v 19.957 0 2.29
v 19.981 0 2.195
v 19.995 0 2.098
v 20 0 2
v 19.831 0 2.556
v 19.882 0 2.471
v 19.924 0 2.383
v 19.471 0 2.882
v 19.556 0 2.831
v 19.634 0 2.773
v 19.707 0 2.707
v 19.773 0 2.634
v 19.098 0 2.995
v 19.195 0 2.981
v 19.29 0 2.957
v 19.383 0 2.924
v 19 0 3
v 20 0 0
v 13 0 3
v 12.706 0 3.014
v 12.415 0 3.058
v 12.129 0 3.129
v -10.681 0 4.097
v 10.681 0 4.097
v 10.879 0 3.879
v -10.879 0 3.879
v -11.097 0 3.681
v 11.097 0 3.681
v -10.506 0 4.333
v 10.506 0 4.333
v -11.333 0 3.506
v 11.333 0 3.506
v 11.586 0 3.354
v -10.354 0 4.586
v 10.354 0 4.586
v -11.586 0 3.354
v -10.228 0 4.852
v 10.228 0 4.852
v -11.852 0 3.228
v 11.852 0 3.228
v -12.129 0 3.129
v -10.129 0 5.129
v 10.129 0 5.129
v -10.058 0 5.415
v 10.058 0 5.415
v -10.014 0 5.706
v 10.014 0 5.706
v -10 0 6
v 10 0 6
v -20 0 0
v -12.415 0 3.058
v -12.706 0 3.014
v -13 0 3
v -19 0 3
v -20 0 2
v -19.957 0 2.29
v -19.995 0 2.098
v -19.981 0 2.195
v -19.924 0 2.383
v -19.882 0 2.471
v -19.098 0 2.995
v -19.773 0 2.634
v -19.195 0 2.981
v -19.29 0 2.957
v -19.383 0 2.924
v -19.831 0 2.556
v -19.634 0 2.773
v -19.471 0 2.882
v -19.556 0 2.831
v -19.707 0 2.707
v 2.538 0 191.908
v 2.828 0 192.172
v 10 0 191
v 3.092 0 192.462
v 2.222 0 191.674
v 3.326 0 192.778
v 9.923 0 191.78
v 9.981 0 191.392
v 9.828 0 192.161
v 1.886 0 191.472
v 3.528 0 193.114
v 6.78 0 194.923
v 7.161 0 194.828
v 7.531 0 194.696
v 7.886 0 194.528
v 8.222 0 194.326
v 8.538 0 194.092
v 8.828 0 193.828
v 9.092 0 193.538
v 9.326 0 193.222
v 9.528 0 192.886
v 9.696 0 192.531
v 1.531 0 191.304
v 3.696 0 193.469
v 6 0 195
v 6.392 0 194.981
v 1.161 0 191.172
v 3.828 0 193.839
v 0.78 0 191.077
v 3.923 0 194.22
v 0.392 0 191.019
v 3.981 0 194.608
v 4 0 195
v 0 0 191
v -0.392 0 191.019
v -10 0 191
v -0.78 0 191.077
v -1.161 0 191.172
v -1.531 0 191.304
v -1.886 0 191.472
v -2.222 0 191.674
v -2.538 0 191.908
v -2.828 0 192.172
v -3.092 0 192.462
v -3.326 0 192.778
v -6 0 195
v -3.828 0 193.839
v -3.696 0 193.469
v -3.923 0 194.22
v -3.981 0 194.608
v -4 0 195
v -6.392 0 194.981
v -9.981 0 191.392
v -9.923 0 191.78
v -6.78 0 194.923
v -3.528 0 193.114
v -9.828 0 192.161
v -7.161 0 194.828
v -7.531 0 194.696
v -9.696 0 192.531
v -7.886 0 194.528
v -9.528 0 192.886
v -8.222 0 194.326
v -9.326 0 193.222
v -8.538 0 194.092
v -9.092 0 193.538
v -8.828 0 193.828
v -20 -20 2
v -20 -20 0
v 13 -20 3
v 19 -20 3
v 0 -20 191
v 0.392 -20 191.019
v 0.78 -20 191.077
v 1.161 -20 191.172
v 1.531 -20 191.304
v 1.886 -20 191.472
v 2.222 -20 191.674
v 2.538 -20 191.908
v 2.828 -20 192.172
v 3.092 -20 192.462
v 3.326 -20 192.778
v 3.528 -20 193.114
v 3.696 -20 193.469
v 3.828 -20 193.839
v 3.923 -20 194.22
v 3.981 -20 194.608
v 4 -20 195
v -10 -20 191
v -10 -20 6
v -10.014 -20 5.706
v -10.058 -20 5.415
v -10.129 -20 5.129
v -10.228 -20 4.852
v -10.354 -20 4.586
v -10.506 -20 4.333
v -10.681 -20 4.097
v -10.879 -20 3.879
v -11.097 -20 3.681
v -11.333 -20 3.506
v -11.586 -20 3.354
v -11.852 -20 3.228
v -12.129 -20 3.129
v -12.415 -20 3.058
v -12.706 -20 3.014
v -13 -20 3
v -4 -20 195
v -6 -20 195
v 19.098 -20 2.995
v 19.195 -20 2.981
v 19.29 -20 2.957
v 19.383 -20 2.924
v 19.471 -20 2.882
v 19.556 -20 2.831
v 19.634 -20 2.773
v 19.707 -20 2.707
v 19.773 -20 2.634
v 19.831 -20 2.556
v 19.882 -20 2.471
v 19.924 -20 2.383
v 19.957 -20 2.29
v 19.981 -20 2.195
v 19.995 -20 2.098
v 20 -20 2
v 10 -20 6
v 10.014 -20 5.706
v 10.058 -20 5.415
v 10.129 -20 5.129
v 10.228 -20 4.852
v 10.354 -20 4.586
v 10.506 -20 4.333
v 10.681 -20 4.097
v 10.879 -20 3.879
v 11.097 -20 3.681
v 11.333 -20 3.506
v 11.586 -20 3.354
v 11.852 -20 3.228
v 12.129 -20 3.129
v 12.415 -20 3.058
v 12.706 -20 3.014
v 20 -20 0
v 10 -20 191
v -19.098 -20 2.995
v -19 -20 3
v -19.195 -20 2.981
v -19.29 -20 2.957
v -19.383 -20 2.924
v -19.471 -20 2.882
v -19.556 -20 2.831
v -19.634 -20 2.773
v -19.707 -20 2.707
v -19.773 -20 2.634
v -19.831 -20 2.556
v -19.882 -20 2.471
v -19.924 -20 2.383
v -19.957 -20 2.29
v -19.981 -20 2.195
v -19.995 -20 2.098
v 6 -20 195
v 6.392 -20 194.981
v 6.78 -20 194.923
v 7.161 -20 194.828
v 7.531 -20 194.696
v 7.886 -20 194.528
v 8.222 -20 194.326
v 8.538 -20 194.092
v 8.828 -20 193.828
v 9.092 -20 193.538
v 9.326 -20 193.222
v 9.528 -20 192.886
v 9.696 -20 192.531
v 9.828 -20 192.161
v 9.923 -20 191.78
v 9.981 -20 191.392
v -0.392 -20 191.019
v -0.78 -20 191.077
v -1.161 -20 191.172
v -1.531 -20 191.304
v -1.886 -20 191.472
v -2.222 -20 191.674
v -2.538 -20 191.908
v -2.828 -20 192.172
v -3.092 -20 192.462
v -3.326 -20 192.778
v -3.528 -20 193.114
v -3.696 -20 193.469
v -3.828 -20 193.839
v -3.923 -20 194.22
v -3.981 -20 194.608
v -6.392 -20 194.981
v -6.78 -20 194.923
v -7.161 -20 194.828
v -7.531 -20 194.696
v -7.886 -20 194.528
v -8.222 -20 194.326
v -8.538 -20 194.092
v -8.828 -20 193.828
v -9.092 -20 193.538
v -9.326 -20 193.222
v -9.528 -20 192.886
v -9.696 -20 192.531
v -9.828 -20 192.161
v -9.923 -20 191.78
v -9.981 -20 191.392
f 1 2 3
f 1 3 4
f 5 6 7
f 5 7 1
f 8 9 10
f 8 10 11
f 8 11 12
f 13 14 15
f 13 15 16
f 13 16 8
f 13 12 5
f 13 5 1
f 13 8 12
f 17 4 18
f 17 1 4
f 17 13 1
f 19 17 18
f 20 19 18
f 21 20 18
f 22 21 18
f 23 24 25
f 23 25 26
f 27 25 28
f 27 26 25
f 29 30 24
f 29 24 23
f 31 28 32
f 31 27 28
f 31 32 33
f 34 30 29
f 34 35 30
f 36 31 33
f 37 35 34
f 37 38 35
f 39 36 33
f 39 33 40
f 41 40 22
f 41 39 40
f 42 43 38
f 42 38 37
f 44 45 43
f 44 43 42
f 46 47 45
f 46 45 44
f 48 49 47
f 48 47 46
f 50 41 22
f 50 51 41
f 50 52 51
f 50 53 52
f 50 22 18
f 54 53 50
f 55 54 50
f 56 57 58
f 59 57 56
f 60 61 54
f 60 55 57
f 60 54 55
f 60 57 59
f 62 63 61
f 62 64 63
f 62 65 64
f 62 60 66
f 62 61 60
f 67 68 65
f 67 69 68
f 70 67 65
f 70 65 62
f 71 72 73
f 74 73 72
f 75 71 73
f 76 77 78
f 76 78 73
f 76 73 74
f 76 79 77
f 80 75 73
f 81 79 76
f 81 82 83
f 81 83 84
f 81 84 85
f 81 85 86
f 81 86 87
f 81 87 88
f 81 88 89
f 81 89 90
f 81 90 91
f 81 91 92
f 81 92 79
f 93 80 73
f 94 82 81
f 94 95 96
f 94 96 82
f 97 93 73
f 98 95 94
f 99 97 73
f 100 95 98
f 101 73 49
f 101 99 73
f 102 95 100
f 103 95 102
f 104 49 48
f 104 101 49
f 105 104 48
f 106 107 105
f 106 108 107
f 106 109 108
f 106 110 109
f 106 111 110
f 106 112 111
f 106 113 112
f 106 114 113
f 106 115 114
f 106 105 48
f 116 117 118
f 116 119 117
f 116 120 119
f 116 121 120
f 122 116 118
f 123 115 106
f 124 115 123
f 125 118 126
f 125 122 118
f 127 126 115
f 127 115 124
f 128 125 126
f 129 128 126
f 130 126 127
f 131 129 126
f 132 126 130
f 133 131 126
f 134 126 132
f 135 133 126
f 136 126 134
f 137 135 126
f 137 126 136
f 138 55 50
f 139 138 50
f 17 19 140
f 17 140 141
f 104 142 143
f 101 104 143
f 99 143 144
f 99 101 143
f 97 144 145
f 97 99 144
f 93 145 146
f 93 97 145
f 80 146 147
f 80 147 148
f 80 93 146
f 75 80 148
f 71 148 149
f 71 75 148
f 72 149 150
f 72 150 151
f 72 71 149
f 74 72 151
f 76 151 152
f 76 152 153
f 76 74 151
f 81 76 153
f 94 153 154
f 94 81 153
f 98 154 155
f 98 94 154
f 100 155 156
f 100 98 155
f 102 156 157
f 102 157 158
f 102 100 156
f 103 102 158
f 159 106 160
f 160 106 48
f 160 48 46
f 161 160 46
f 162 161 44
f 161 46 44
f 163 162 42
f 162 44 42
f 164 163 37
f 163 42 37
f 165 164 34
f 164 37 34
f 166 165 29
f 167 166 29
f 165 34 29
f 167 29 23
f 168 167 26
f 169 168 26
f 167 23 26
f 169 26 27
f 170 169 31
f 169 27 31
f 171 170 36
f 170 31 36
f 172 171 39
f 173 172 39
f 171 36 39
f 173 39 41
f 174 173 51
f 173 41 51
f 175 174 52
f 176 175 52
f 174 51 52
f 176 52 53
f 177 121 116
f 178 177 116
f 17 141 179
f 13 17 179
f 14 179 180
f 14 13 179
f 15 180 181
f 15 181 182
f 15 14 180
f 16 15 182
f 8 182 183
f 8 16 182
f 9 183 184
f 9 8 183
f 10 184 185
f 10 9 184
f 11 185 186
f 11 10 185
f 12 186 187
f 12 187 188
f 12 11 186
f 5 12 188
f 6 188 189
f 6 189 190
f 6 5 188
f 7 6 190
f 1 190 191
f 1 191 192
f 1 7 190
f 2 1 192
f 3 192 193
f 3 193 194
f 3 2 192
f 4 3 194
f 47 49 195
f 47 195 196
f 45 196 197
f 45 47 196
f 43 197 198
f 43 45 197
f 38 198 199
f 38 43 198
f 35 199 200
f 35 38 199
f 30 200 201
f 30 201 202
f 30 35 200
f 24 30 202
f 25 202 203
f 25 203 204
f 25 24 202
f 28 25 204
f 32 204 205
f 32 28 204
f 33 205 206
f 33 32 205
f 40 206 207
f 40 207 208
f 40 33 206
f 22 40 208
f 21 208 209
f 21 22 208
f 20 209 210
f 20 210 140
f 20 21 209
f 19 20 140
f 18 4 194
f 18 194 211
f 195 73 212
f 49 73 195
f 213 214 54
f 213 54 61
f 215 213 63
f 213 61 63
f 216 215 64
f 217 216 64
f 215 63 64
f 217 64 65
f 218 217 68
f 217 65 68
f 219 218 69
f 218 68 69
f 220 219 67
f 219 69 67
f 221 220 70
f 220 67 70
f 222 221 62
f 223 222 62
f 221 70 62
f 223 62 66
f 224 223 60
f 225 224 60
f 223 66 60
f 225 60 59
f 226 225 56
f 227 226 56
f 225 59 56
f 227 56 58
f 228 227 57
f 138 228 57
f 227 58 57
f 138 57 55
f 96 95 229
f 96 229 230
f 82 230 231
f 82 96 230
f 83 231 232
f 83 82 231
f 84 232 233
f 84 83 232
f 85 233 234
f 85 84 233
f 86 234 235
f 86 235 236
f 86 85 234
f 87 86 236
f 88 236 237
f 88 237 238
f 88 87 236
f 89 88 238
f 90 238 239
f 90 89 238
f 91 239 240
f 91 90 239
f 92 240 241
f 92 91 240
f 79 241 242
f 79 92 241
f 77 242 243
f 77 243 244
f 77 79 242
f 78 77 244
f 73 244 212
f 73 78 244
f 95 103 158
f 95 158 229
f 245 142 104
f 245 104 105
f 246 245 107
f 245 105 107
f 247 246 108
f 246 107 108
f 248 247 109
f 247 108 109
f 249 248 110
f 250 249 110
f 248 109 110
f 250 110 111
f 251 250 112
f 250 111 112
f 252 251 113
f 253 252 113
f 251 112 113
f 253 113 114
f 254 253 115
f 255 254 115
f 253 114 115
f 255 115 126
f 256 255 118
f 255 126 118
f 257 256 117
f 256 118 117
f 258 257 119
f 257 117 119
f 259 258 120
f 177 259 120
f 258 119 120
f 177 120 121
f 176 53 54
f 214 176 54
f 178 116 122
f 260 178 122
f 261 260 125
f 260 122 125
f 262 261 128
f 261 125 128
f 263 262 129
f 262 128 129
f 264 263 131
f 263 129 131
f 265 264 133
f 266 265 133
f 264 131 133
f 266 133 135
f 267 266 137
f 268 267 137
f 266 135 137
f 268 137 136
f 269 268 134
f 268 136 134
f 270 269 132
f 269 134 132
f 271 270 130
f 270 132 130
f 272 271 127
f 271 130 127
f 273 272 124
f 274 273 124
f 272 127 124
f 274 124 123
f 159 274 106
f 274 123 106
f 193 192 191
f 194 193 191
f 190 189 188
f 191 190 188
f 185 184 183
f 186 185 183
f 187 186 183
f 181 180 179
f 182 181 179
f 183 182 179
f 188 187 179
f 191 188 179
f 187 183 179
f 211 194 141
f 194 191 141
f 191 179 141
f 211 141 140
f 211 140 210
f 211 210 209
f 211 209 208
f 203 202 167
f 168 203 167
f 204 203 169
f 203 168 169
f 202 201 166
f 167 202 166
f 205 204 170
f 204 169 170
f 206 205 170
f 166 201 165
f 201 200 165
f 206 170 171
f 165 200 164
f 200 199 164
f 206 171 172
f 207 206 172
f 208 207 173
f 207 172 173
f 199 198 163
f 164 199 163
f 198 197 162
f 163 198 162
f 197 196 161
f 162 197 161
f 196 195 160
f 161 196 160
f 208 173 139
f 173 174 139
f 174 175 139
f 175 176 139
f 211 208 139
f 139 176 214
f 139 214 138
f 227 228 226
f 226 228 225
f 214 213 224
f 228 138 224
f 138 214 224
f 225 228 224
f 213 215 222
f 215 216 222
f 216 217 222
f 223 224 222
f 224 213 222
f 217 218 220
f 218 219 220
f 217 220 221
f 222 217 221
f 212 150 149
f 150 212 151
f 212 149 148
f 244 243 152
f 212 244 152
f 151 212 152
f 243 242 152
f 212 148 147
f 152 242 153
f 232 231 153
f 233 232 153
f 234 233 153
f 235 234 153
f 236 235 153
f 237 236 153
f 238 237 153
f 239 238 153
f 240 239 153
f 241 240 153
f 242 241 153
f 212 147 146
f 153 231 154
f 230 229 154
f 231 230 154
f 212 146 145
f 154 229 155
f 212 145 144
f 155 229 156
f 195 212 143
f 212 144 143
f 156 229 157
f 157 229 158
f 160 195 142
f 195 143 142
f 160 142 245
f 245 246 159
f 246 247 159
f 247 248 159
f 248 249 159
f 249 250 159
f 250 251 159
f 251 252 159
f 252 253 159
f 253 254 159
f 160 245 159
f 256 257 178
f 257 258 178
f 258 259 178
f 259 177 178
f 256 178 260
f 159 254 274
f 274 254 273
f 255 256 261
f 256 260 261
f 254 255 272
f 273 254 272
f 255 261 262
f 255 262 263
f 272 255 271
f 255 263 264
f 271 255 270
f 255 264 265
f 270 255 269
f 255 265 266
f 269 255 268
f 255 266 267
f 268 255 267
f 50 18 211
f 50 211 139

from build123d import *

# Parameters (mm, degrees)
F1_DEPTH = 20


with BuildPart() as f1:
    # F0 (on Front) → F1 (new body)
    with BuildSketch(Plane.XZ):
        with BuildLine():
            Line((-20, 0), (0, 0))
            Line((0, 0), (0, 191))
            ThreePointArc((0, 191), (-2.828427, 192.171573), (-4, 195))
            Line((-4, 195), (-6, 195))
            ThreePointArc((-6, 195), (-8.828427, 193.828427), (-10, 191))
            Line((-10, 191), (-10, 6))
            ThreePointArc((-10, 6), (-10.87868, 3.87868), (-13, 3))
            Line((-13, 3), (-19, 3))
            ThreePointArc((-19, 3), (-19.707107, 2.707107), (-20, 2))
            Line((-20, 2), (-20, 0))
        make_face()
    extrude(amount=F1_DEPTH)

    # F2: F1 across face


with BuildPart() as f1_1:
    add(f1.part)
    add(f1.part.mirror(Plane(origin=(0, -10, 95.5), x_dir=(0, 1, 0), z_dir=(1, 0, 0))))


solid = f1_1.part
